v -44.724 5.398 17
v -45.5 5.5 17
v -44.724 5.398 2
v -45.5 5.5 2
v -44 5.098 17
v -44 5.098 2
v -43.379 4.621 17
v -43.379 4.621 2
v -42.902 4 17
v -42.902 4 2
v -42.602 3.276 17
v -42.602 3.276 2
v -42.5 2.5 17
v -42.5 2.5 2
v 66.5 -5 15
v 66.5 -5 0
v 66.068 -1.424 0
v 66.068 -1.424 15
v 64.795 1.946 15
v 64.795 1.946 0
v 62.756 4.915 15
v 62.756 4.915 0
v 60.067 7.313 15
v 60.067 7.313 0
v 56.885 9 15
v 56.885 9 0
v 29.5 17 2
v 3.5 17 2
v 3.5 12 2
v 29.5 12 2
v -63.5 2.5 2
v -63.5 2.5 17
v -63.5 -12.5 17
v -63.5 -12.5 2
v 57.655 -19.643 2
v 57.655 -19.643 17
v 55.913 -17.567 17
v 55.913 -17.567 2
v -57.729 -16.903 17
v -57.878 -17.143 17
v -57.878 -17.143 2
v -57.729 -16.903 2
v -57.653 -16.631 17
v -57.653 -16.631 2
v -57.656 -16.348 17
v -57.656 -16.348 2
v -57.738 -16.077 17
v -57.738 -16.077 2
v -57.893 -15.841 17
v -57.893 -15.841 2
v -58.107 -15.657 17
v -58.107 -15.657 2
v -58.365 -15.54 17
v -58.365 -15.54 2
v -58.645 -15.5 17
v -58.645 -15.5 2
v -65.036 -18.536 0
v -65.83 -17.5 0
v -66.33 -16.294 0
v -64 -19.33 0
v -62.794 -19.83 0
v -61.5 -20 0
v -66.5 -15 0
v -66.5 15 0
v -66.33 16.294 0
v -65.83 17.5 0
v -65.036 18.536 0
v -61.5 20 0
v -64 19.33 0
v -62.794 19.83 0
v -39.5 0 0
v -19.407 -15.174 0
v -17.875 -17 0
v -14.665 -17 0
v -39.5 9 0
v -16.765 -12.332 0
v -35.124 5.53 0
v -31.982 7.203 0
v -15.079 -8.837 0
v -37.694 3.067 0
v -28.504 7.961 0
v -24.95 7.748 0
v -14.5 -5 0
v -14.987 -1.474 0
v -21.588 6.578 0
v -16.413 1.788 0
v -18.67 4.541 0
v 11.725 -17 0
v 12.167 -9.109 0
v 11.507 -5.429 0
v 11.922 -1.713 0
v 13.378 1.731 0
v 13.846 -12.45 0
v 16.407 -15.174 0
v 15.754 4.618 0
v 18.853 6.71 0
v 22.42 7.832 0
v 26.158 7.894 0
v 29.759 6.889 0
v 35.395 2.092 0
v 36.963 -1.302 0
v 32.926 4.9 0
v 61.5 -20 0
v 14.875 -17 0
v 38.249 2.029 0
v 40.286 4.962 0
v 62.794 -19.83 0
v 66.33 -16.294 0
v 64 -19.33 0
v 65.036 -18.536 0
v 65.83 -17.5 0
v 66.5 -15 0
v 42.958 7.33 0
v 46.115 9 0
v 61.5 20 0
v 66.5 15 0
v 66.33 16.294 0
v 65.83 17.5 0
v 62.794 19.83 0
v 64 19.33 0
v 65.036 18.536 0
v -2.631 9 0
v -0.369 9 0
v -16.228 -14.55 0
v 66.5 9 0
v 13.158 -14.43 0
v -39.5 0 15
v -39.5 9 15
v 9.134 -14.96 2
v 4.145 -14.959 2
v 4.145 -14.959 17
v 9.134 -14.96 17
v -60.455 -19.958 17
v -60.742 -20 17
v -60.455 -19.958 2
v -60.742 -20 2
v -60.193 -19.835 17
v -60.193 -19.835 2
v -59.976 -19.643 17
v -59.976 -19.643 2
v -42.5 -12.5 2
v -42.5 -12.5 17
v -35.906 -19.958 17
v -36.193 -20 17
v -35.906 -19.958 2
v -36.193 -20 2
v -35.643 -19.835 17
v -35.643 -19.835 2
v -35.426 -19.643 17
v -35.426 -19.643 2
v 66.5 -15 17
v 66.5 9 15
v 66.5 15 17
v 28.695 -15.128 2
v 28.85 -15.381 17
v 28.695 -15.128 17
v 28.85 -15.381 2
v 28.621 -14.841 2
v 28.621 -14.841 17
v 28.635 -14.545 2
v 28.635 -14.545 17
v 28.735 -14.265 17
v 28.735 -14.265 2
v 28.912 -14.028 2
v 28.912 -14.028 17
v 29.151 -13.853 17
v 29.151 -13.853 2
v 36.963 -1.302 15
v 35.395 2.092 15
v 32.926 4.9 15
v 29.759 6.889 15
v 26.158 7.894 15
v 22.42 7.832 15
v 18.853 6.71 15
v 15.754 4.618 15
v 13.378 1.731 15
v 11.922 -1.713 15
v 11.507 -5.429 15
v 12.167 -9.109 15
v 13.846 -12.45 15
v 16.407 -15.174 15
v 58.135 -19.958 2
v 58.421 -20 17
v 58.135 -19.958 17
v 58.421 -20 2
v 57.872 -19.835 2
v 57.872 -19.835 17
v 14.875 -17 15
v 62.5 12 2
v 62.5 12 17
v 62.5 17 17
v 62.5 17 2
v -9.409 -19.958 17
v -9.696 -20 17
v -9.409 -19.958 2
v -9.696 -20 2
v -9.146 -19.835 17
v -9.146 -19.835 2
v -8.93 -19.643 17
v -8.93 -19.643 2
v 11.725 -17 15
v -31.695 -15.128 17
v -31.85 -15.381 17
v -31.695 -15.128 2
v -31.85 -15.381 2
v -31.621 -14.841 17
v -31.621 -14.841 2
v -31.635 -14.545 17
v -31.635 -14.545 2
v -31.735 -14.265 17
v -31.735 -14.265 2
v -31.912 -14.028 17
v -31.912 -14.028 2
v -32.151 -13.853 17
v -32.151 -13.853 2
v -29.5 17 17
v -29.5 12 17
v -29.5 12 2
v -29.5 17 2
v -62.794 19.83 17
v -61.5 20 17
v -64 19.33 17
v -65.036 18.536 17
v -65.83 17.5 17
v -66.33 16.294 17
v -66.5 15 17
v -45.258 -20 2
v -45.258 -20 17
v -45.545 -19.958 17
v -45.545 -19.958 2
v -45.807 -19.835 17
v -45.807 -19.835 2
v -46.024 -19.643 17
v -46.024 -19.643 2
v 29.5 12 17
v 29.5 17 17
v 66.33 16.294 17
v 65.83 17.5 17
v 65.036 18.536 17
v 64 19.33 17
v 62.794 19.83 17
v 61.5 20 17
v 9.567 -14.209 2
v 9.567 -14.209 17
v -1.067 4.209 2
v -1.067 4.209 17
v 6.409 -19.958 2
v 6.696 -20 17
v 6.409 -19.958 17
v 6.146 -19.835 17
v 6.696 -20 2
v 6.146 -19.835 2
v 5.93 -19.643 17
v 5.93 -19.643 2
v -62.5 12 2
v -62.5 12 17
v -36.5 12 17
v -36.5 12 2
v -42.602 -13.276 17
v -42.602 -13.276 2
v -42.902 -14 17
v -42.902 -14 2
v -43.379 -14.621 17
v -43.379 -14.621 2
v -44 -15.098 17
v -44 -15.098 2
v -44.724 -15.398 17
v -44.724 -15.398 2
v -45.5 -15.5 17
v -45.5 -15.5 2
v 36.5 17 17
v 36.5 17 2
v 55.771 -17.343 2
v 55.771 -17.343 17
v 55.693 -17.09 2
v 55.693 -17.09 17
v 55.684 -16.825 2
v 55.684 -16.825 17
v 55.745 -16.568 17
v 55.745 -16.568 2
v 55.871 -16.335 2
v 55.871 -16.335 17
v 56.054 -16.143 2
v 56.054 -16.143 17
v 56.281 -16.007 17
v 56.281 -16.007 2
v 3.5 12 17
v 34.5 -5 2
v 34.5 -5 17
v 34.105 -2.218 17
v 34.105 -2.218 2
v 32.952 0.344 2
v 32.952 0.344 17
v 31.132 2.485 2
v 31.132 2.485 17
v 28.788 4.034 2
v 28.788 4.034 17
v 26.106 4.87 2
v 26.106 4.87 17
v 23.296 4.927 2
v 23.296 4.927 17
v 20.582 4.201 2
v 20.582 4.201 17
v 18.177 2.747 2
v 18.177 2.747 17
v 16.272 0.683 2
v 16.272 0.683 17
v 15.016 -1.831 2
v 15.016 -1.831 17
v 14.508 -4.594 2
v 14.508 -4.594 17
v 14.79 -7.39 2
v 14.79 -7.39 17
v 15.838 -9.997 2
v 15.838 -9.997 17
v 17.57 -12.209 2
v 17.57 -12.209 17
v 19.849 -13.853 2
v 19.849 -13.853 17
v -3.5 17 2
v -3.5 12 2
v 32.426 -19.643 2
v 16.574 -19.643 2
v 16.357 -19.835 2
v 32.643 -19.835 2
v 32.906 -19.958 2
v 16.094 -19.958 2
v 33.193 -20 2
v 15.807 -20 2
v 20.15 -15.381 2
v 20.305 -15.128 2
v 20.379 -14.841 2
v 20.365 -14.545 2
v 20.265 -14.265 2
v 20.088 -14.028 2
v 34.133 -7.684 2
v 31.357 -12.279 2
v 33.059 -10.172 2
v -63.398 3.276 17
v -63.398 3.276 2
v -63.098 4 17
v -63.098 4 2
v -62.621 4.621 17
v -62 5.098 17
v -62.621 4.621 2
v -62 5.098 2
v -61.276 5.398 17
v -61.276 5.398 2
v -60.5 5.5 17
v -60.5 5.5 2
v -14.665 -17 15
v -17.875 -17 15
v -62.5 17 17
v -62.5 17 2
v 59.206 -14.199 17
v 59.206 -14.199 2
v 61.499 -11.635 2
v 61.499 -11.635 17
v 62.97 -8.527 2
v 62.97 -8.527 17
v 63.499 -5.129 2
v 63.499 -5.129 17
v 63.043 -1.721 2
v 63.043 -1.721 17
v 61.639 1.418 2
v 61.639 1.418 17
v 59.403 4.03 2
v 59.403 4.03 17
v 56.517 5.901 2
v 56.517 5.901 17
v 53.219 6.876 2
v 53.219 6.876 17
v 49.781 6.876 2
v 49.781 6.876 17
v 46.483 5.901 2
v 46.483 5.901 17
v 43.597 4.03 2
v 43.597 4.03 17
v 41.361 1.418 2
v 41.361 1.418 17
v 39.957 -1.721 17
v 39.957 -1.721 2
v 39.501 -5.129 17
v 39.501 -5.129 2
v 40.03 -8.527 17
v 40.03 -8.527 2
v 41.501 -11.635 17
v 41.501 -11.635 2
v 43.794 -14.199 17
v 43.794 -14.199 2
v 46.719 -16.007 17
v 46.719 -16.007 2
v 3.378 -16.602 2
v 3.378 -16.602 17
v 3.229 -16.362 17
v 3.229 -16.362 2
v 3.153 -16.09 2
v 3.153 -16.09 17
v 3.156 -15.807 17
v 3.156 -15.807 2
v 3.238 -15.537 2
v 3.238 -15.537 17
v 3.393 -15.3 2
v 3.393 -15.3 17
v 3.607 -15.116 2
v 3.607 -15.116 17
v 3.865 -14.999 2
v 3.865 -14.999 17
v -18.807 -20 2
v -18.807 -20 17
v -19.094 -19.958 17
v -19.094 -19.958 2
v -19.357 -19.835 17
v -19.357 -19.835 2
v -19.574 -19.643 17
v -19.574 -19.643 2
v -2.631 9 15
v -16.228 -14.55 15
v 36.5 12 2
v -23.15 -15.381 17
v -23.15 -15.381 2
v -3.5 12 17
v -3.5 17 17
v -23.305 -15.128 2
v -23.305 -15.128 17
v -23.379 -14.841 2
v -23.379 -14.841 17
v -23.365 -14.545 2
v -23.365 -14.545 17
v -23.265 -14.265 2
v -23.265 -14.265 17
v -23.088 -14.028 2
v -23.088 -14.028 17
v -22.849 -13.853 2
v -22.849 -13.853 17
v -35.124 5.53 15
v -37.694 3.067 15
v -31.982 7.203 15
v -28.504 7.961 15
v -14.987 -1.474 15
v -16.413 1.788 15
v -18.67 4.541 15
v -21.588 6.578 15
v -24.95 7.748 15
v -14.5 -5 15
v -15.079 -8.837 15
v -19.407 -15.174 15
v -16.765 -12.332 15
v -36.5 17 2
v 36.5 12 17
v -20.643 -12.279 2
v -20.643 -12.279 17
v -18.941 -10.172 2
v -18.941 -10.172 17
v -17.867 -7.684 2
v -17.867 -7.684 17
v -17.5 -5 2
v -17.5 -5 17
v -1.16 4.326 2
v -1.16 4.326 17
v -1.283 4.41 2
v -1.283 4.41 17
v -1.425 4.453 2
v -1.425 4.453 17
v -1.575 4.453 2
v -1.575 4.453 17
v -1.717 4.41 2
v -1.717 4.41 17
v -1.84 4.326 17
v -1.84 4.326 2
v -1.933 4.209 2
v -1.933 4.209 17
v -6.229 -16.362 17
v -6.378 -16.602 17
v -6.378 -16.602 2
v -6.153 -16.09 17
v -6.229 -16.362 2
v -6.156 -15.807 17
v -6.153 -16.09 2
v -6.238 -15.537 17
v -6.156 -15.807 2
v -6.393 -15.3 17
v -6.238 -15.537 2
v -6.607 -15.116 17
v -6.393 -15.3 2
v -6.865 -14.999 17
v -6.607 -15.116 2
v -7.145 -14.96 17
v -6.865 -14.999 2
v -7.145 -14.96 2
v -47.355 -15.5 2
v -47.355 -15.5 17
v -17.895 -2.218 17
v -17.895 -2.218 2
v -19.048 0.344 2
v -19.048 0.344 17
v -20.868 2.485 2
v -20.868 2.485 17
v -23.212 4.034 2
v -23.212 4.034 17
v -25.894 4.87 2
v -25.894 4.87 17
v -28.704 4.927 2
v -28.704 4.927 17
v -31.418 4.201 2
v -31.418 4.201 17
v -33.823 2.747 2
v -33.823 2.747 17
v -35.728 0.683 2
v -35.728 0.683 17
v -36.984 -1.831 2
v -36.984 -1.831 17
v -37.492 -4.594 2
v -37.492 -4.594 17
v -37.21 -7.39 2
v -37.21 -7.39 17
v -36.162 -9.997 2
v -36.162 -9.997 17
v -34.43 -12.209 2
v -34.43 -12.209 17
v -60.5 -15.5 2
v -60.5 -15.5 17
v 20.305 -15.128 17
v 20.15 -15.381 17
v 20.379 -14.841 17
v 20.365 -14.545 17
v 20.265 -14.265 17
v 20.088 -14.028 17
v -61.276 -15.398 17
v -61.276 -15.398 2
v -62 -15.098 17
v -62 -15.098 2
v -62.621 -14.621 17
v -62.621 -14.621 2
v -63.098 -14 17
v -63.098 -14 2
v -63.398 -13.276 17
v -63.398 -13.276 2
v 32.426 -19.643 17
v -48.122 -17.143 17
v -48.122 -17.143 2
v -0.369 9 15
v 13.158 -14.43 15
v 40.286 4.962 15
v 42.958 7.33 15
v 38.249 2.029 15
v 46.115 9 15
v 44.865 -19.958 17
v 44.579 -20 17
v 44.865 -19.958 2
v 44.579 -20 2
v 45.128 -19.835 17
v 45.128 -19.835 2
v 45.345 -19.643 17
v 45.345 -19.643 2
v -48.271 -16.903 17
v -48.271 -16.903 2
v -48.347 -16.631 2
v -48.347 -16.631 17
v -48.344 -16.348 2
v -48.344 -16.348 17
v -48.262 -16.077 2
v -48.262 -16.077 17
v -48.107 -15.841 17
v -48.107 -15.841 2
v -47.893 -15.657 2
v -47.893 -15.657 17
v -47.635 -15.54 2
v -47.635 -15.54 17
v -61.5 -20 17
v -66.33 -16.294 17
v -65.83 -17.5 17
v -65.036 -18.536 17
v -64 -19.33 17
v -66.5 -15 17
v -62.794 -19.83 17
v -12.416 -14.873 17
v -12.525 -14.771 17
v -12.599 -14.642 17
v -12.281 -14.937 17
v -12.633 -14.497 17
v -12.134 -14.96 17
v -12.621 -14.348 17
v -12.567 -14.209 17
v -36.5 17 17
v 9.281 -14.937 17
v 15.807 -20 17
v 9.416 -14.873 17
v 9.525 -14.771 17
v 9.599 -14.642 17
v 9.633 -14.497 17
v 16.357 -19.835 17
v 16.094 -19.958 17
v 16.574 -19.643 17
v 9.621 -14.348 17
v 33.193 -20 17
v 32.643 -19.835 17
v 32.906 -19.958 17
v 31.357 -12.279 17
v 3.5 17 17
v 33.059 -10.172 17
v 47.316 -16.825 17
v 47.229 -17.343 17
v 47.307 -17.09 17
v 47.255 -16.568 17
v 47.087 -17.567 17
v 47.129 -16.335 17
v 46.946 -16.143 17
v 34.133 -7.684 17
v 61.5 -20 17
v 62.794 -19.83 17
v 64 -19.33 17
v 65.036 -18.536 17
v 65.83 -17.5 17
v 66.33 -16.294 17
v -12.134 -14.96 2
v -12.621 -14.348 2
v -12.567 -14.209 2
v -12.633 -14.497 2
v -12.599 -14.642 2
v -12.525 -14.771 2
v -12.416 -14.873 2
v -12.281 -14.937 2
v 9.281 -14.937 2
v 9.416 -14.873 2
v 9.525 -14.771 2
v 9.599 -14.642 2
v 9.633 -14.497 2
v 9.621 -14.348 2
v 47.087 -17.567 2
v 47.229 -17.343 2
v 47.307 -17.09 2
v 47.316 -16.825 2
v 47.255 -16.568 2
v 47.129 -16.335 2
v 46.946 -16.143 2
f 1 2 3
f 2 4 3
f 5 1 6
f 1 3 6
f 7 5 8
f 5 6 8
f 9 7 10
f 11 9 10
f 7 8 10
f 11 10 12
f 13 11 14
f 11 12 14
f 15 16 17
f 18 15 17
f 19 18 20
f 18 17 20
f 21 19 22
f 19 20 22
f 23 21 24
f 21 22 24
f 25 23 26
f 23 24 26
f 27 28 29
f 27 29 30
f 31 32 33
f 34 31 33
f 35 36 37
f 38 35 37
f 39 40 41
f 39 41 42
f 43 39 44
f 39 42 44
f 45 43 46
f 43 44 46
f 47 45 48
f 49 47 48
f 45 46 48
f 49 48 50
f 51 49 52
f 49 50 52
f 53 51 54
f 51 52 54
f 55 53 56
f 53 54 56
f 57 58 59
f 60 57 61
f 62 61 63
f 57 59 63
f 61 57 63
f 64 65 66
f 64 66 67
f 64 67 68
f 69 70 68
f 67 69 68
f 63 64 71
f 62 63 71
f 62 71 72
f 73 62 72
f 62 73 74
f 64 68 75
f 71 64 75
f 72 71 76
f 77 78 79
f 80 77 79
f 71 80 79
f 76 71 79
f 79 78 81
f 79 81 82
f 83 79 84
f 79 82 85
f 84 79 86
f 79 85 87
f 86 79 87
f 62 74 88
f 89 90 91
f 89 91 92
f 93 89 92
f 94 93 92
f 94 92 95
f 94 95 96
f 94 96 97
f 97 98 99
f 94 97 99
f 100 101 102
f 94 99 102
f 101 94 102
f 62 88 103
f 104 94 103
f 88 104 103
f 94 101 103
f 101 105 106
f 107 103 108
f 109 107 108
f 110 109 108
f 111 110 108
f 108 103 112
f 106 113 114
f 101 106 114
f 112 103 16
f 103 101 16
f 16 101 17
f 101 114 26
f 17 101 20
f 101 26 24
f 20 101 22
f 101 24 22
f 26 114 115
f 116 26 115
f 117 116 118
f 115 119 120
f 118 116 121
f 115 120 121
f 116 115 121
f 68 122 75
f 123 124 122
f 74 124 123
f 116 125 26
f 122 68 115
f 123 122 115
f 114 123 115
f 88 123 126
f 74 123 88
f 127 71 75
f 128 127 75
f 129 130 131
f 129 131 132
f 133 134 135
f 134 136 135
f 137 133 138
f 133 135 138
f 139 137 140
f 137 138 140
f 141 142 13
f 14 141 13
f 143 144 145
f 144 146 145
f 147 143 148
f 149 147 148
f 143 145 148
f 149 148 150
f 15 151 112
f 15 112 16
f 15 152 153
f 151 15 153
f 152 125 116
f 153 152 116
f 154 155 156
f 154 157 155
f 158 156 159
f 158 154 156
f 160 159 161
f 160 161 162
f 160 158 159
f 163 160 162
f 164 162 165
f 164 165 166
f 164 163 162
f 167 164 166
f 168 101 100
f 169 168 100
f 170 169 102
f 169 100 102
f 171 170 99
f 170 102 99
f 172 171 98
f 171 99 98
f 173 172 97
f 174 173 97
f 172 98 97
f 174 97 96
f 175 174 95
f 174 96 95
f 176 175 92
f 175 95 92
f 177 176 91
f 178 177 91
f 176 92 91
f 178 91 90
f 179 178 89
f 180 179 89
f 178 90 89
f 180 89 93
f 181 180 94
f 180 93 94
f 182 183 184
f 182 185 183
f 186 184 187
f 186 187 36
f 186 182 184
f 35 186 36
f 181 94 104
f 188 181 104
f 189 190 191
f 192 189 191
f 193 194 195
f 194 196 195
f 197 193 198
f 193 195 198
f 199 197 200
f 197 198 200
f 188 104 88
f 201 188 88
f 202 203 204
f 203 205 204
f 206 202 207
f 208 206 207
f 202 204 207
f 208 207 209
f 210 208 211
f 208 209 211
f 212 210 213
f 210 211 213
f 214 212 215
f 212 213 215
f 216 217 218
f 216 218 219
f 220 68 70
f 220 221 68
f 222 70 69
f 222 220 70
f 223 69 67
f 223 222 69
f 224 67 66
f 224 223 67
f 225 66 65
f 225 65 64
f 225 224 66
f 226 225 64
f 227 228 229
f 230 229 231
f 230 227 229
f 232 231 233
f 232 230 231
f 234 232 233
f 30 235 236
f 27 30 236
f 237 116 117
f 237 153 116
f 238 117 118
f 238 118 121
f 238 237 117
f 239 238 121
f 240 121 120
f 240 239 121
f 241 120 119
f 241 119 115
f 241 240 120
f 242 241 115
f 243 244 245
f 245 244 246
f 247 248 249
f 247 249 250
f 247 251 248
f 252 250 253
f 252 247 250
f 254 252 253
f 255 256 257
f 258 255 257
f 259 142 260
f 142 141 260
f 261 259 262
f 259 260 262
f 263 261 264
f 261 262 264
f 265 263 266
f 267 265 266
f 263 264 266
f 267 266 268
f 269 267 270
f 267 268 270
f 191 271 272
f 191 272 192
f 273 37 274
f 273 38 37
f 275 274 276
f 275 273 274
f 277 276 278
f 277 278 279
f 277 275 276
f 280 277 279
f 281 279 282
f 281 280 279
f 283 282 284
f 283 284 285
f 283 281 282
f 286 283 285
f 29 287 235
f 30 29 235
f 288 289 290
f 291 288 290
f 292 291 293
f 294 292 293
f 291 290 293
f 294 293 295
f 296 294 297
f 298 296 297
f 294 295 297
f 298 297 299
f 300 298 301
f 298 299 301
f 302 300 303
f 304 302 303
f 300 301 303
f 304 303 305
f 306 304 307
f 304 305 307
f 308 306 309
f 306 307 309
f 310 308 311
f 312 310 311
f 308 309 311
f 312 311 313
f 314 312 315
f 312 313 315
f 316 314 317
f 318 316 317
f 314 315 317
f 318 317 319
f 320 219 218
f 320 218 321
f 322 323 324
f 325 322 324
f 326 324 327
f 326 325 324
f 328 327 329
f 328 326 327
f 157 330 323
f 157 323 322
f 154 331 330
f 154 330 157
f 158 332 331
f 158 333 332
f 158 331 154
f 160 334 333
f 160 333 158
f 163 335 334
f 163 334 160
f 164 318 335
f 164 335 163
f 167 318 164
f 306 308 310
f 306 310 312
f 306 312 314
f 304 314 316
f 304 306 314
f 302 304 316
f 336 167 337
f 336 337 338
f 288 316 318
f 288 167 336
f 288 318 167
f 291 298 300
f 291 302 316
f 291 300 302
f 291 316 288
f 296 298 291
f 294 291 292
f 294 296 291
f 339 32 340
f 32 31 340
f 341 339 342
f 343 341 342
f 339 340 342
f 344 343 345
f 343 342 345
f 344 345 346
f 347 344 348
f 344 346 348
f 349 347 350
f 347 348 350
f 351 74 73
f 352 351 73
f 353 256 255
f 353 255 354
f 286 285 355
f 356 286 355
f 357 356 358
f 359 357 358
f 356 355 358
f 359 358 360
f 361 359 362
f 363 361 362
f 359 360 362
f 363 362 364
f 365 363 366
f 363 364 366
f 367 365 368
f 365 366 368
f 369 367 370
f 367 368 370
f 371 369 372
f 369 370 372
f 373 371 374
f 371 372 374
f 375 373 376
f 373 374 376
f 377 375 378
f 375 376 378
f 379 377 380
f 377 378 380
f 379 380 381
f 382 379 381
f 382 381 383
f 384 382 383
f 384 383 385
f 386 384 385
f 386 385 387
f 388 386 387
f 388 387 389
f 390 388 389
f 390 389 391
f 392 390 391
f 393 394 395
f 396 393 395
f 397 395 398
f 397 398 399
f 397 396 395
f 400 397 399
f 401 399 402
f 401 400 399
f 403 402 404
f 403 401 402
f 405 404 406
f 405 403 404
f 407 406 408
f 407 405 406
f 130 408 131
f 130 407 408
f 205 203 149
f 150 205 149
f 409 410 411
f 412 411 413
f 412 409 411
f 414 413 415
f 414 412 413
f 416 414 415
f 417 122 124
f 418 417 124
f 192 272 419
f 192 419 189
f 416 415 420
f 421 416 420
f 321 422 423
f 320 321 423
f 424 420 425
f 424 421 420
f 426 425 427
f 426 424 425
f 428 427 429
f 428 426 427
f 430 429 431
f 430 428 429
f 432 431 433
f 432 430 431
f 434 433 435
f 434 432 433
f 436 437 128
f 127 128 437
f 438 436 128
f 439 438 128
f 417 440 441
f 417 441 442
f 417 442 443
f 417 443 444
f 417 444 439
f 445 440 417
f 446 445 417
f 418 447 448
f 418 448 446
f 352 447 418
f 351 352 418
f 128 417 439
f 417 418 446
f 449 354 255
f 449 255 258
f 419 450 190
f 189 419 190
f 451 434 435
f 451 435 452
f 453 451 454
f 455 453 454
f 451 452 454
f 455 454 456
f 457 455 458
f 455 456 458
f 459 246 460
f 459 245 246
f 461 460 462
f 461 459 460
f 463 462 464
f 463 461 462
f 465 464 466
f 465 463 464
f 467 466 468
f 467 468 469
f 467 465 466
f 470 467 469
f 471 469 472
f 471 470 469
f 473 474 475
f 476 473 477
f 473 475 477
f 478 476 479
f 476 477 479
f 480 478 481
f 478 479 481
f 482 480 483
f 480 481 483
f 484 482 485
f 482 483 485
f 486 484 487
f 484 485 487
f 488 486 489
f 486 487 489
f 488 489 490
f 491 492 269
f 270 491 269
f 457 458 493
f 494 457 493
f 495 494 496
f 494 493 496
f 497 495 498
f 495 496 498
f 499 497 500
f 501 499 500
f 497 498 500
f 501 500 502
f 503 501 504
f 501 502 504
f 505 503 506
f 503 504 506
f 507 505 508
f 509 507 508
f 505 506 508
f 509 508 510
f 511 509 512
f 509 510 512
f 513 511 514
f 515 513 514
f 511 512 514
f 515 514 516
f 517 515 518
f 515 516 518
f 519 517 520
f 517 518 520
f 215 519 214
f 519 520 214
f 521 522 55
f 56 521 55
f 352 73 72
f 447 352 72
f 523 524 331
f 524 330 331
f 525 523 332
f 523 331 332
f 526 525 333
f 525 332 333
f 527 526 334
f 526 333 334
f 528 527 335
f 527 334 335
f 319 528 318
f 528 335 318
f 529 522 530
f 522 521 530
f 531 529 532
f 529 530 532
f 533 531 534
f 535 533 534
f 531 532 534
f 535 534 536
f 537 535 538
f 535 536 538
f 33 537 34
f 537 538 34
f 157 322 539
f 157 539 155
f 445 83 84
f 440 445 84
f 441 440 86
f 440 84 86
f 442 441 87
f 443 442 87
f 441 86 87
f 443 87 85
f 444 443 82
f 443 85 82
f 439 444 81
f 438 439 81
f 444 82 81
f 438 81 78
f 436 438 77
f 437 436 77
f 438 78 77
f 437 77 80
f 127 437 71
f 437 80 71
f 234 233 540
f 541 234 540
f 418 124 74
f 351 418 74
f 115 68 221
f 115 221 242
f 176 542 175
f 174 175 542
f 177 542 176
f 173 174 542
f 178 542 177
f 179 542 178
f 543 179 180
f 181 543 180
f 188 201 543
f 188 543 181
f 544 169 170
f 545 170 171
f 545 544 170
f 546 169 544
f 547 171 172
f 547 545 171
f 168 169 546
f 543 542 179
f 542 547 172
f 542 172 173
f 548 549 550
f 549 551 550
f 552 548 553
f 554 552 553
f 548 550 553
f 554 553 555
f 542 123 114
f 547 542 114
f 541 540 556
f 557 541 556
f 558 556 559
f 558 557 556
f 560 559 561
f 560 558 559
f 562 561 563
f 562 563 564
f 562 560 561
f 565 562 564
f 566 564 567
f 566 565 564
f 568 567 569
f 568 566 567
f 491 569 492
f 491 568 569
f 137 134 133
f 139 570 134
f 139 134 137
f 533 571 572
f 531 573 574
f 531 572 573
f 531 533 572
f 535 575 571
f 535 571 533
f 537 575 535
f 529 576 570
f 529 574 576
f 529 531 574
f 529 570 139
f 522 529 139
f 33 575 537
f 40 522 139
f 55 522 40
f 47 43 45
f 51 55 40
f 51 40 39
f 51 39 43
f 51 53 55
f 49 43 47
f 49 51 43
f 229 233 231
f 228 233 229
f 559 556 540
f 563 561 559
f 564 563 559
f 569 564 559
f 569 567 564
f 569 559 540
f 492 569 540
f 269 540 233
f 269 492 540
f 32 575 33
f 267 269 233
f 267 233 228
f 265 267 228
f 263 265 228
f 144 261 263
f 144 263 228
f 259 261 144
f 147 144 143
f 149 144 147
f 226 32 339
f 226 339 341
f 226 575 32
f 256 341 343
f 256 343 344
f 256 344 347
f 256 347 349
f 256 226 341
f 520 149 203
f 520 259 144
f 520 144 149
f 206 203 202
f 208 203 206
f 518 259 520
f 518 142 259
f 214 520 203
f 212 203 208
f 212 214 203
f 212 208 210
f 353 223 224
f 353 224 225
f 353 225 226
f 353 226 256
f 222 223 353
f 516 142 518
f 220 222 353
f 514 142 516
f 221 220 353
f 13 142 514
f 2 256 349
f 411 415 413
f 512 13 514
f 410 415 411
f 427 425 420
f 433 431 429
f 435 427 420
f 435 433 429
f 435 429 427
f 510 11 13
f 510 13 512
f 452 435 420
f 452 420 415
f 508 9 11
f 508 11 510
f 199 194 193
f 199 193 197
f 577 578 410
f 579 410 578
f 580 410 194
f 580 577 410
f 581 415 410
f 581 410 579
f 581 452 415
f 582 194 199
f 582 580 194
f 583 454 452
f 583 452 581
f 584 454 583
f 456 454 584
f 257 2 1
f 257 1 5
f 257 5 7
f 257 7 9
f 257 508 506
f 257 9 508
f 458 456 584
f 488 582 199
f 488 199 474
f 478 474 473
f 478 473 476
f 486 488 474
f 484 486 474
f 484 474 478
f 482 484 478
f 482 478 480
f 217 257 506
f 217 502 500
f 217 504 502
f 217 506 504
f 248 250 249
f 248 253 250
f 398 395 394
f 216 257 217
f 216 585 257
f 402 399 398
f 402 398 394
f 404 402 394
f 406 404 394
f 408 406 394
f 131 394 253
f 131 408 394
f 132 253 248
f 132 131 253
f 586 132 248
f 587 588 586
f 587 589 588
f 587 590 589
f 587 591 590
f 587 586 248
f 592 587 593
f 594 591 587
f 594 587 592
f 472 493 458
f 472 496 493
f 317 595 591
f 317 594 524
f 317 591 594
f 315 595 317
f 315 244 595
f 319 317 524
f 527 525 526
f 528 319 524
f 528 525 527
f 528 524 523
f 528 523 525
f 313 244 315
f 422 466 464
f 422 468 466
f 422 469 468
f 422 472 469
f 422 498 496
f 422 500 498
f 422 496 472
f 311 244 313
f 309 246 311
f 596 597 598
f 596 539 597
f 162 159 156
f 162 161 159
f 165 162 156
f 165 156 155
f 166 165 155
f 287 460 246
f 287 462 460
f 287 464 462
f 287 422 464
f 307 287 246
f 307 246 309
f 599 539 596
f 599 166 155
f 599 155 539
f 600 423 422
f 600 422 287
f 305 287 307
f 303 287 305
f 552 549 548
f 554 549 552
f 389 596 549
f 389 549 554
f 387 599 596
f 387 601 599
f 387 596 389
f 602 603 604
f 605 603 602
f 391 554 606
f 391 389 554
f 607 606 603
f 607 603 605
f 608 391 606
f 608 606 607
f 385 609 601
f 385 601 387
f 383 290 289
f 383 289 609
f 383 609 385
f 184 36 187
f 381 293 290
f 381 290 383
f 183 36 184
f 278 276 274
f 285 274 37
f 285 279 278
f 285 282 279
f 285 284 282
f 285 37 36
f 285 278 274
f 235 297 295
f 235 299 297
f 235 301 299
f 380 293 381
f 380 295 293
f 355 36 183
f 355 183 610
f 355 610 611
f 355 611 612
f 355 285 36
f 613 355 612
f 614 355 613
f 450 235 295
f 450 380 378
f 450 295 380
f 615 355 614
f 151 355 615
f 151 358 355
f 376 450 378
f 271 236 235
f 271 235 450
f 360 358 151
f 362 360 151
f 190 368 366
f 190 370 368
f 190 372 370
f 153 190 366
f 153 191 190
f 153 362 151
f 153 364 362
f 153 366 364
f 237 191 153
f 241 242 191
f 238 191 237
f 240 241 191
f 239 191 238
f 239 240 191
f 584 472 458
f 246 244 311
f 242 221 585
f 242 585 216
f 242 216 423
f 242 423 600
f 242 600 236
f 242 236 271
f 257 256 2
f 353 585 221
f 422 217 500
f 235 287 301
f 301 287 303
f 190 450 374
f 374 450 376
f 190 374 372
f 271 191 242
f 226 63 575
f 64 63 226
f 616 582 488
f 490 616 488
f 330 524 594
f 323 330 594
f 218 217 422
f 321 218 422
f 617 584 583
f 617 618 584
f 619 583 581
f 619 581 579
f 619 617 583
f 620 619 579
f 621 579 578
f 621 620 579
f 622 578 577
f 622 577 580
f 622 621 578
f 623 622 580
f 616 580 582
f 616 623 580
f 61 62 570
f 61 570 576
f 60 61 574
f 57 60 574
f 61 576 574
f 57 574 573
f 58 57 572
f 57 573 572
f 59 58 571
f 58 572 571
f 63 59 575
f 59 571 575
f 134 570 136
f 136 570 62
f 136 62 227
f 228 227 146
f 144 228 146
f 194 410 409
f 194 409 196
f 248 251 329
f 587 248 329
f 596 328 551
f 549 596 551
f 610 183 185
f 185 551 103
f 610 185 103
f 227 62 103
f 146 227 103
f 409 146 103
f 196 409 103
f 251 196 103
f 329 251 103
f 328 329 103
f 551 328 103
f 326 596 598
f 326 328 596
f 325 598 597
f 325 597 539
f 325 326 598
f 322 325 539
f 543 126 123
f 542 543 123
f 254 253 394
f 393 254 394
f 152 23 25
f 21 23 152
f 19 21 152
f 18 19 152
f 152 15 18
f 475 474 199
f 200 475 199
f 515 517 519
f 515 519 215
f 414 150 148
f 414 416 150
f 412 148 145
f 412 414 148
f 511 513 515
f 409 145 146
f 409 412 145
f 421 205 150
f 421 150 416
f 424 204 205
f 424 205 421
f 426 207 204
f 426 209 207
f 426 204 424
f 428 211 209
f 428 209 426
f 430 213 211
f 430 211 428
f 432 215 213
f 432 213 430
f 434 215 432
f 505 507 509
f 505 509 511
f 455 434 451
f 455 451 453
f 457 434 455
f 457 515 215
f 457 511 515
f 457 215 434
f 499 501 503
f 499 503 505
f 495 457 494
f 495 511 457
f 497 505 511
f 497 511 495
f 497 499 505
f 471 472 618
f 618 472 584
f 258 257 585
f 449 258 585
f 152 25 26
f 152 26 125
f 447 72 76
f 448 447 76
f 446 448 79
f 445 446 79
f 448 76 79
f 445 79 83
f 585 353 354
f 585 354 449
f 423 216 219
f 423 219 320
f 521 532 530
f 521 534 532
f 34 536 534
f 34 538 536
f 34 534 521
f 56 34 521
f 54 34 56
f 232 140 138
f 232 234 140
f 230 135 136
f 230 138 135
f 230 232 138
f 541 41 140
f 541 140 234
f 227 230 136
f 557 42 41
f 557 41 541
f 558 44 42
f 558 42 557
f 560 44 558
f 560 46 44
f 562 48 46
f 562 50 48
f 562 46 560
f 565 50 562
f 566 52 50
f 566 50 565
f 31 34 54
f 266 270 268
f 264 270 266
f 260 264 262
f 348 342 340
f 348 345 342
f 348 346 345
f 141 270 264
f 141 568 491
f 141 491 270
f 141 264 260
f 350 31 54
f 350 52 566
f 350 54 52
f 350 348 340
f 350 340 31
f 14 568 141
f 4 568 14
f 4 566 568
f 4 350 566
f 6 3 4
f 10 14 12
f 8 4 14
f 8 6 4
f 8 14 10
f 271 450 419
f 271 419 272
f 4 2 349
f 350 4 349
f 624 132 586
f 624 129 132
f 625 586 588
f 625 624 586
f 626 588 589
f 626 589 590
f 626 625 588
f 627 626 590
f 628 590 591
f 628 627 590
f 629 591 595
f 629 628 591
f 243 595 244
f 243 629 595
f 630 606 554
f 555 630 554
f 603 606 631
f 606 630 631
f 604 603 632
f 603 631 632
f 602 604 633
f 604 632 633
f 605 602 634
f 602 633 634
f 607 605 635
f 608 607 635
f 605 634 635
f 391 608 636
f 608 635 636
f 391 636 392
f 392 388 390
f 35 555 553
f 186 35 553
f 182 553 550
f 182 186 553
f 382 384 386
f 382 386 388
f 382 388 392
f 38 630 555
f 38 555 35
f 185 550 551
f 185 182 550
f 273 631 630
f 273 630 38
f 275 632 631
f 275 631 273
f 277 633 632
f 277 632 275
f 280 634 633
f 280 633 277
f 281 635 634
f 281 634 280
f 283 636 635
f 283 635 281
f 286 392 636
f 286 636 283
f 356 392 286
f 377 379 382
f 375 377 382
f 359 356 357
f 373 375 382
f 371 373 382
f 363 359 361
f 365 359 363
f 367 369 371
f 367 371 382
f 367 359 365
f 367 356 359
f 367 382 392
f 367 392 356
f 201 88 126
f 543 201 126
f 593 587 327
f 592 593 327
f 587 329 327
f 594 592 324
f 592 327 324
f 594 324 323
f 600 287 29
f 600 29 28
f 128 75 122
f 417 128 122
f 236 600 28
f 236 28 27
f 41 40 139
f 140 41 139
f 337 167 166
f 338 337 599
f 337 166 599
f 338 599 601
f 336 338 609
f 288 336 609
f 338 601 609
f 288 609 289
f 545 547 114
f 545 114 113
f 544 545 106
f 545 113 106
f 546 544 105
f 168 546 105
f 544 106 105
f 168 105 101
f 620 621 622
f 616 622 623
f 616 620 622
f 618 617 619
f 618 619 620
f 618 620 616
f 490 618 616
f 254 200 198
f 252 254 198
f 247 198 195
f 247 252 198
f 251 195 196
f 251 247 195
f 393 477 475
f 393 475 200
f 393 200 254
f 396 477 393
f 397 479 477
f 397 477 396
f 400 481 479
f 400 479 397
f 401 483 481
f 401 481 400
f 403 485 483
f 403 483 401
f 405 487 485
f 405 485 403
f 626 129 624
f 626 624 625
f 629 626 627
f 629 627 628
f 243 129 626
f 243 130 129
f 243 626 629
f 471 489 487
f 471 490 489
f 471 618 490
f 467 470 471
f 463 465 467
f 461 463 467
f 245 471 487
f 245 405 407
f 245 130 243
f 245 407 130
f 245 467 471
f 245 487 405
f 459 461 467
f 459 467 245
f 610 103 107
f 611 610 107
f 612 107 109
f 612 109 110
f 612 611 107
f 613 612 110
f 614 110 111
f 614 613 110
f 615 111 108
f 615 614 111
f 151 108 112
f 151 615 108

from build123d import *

# Parameters (mm, degrees)
F0_W      = 133
F0_H      = 40
F1_DEPTH  = 17
F2_W      = 26
F2_H      = 5
F3_DEPTH  = 15
F4_R      = 1
F5_R      = 0.5
F6_R      = 5
F7_R      = 3
F10_DEPTH = 15


with BuildPart() as f1:
    # F0 (on Top) → F1 (new body)
    with BuildSketch(Plane.XY):
        Rectangle(F0_W, F0_H)
    extrude(amount=F1_DEPTH)

    # F2 (on face) → F3 (cut)
    with BuildSketch(Plane.XY.offset(17)):
        with Locations((-16.5, 14.5)):
            Rectangle(F2_W, F2_H)
        with Locations((16.5, 14.5)):
            Rectangle(F2_W, F2_H)
        with Locations((49.5, 14.5)):
            Rectangle(F2_W, F2_H)
        Polygon((-49.5, -15.5), (-42.5, -15.5), (-42.5, 5.5), (-63.5, 5.5), (-63.5, -15.5), (-56.5, -15.5), align=None)
        with BuildLine():
            ThreePointArc((-17.5, -5), (-33.2008771255, 3.2158383626), (-31, -14.3674969976))
            ThreePointArc((-31, -14.3674969976), (-27.5, -15), (-24, -14.3674969976))
            ThreePointArc((-24, -14.3674969976), (-19.2841616374, -10.7008771255), (-17.5, -5))
        make_face()
        with BuildLine():
            ThreePointArc((34.5, -5), (18.7991228745, 3.2158383626), (21, -14.3674969976))
            ThreePointArc((21, -14.3674969976), (24.5, -15), (28, -14.3674969976))
            ThreePointArc((28, -14.3674969976), (32.7158383626, -10.7008771255), (34.5, -5))
        make_face()
        with BuildLine():
            ThreePointArc((48, -16.4782402832), (51.5, -17), (55, -16.4782402832))
            ThreePointArc((55, -16.4782402832), (61.143650761, -12.1414284285), (63.5, -5))
            ThreePointArc((63.5, -5), (44.3585715715, 4.643650761), (48, -16.4782402832))
        make_face()
        Polygon((-13, -14.9595), (-5, -14.9595), (-1.5, -14.9595), (-1.5, 4.95908), align=None)
        Polygon((-1.5, 4.95908), (-1.5, -14.9595), (2, -14.9595), (10, -14.9595), align=None)
        with Locations((-49.5, 14.5)):
            Rectangle(F2_W, F2_H)
        Polygon((-45.7240516597, -20), (-49.5, -15.5), (-56.5, -15.5), (-60.2759483403, -20), align=None)
        with BuildLine():
            Line((-31, -14.3674969976), (-35.7262311919, -20))
            Line((-35.7262311919, -20), (-19.2737688081, -20))
            Line((-19.2737688081, -20), (-24, -14.3674969976))
            ThreePointArc((-24, -14.3674969976), (-27.5, -15), (-31, -14.3674969976))
        make_face()
        Polygon((-5, -14.9595), (-9.2294816909, -20), (6.2294816909, -20), (2, -14.9595), (-1.5, -14.9595), align=None)
        with BuildLine():
            Line((21, -14.3674969976), (16.2737688081, -20))
            Line((16.2737688081, -20), (32.7262311919, -20))
            Line((32.7262311919, -20), (28, -14.3674969976))
            ThreePointArc((28, -14.3674969976), (24.5, -15), (21, -14.3674969976))
        make_face()
        with BuildLine():
            Line((45.0448927206, -20), (57.9551072794, -20))
            Line((57.9551072794, -20), (55, -16.4782402832))
            ThreePointArc((55, -16.4782402832), (51.5, -17), (48, -16.4782402832))
            Line((48, -16.4782402832), (45.0448927206, -20))
        make_face()
    extrude(amount=-F3_DEPTH, mode=Mode.SUBTRACT)

    # F4
    f4_edges = [f1.edges().sort_by_distance(p)[0] for p in [
        (21, -14.367497, 9.5),
        (28, -14.367497, 9.5),
        (55, -16.47824, 9.5),
        (57.955107, -20, 9.5),
        (45.044893, -20, 9.5),
        (48, -16.47824, 9.5),
        (32.726231, -20, 9.5),
        (16.273769, -20, 9.5),
        (6.229482, -20, 9.5),
        (2, -14.9595, 9.5),
        (-5, -14.9595, 9.5),
        (-9.229482, -20, 9.5),
        (-24, -14.367497, 9.5),
        (-19.273769, -20, 9.5),
        (-31, -14.367497, 9.5),
        (-35.726231, -20, 9.5),
        (-56.5, -15.5, 9.5),
        (-60.275948, -20, 9.5),
        (-49.5, -15.5, 9.5),
        (-45.724052, -20, 9.5),
    ]]
    fillet(f4_edges, radius=F4_R)

    # F5
    f5_edges = [f1.edges().sort_by_distance(p)[0] for p in [
        (-1.5, 4.95908, 9.5),
        (-13, -14.9595, 9.5),
        (10, -14.9595, 9.5),
    ]]
    fillet(f5_edges, radius=F5_R)

    # F6
    f6_edges = [f1.edges().sort_by_distance(p)[0] for p in [
        (-66.5, -20, 8.5),
        (-66.5, 20, 8.5),
        (66.5, -20, 8.5),
        (66.5, 20, 8.5),
    ]]
    fillet(f6_edges, radius=F6_R)

    # F7
    f7_edges = [f1.edges().sort_by_distance(p)[0] for p in [
        (-42.5, 5.5, 9.5),
        (-63.5, 5.5, 9.5),
        (-63.5, -15.5, 9.5),
        (-42.5, -15.5, 9.5),
    ]]
    fillet(f7_edges, radius=F7_R)

    # F9 (on face) → F10 (cut)
    with BuildSketch(Plane(origin=(0, 0, 0), x_dir=(1, 0, 0), z_dir=(0, 0, -1))):
        with BuildLine():
            Line((-39.5, -9), (-2.6310750496, -9))
            Line((-2.6310750496, -9), (-16.2277130067, 14.5500626852))
            Line((-16.2277130067, 14.5500626852), (-14.6648491969, 17))
            Line((-14.6648491969, 17), (-17.8748458336, 17))
            Line((-17.8748458336, 17), (-19.4071963049, 15.1738158207))
            ThreePointArc((-19.4071963049, 15.1738158207), (-15.7908914081, 10.6477230794), (-14.5, 5))
            ThreePointArc((-14.5, 5), (-24.9504902432, -7.747548784), (-39.5, 0))
            Line((-39.5, 0), (-39.5, -9))
        make_face()
        with BuildLine():
            Line((13.1582028158, 14.4296675288), (-0.3689249504, -9))
            Line((-0.3689249504, -9), (46.1148351929, -9))
            ThreePointArc((46.1148351929, -9), (40.2858667229, -4.9620888795), (36.962962963, 1.3020878615))
            ThreePointArc((36.962962963, 1.3020878615), (17.2280826359, -5.7758627427), (16.4071963049, 15.1738158207))
            Line((16.4071963049, 15.1738158207), (14.8748458336, 17))
            Line((14.8748458336, 17), (11.7246036518, 17))
            Line((11.7246036518, 17), (13.1582028158, 14.4296675288))
        make_face()
        with BuildLine():
            ThreePointArc((66.5, 5), (63.8648184804, -3.4918351342), (56.8851648071, -9))
            Line((56.8851648071, -9), (66.5, -9))
            Line((66.5, -9), (66.5, 5))
        make_face()
    extrude(amount=-F10_DEPTH, mode=Mode.SUBTRACT)


solid = f1.part
